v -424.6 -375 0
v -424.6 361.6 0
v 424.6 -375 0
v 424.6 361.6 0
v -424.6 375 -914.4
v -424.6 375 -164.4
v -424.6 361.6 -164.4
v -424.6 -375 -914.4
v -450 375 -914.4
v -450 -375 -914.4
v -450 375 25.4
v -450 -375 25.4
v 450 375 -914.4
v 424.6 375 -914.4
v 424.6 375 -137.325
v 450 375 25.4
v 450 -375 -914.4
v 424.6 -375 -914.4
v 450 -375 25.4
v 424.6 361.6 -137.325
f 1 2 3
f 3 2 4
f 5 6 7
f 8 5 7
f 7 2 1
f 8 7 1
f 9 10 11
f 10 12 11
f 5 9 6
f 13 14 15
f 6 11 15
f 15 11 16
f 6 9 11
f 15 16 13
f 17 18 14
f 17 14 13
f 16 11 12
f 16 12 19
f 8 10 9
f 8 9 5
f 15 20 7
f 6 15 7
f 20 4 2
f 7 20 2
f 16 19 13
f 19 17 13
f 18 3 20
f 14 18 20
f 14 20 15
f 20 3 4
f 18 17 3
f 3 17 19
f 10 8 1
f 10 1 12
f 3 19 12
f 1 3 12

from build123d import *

# Parameters (mm, degrees)
F0_W     = 900
F0_H     = 750
F1_DEPTH = 25.4
F3_DEPTH = 914.4
F5_DEPTH = 25.4


with BuildPart() as f1:
    # F0 (on Top) → F1 (new body)
    with BuildSketch(Plane.XY):
        Rectangle(F0_W, F0_H)
    extrude(amount=F1_DEPTH)

    # F2 (on face) → F3 (join)
    with BuildSketch(Plane(origin=(0, 0, 0), x_dir=(1, 0, 0), z_dir=(0, 0, -1))):
        Polygon((-424.6, 375), (-450, 375), (-450, -375), (-424.6, -361.6), align=None)
        Polygon((-424.6, -361.6), (-450, -375), (450, -375), (424.6, -361.6), align=None)
        Polygon((424.6, -361.6), (450, -375), (450, 375), (424.6, 375), align=None)
    extrude(amount=F3_DEPTH)

    # F4 (on face) → F5 (cut)
    with BuildSketch(Plane.XZ.offset(-361.6)):
        Polygon((424.6, -137.324512), (-424.6, -164.4), (-424.6, -914.4), (424.6, -914.4), align=None)
    extrude(amount=-F5_DEPTH, mode=Mode.SUBTRACT)


solid = f1.part
